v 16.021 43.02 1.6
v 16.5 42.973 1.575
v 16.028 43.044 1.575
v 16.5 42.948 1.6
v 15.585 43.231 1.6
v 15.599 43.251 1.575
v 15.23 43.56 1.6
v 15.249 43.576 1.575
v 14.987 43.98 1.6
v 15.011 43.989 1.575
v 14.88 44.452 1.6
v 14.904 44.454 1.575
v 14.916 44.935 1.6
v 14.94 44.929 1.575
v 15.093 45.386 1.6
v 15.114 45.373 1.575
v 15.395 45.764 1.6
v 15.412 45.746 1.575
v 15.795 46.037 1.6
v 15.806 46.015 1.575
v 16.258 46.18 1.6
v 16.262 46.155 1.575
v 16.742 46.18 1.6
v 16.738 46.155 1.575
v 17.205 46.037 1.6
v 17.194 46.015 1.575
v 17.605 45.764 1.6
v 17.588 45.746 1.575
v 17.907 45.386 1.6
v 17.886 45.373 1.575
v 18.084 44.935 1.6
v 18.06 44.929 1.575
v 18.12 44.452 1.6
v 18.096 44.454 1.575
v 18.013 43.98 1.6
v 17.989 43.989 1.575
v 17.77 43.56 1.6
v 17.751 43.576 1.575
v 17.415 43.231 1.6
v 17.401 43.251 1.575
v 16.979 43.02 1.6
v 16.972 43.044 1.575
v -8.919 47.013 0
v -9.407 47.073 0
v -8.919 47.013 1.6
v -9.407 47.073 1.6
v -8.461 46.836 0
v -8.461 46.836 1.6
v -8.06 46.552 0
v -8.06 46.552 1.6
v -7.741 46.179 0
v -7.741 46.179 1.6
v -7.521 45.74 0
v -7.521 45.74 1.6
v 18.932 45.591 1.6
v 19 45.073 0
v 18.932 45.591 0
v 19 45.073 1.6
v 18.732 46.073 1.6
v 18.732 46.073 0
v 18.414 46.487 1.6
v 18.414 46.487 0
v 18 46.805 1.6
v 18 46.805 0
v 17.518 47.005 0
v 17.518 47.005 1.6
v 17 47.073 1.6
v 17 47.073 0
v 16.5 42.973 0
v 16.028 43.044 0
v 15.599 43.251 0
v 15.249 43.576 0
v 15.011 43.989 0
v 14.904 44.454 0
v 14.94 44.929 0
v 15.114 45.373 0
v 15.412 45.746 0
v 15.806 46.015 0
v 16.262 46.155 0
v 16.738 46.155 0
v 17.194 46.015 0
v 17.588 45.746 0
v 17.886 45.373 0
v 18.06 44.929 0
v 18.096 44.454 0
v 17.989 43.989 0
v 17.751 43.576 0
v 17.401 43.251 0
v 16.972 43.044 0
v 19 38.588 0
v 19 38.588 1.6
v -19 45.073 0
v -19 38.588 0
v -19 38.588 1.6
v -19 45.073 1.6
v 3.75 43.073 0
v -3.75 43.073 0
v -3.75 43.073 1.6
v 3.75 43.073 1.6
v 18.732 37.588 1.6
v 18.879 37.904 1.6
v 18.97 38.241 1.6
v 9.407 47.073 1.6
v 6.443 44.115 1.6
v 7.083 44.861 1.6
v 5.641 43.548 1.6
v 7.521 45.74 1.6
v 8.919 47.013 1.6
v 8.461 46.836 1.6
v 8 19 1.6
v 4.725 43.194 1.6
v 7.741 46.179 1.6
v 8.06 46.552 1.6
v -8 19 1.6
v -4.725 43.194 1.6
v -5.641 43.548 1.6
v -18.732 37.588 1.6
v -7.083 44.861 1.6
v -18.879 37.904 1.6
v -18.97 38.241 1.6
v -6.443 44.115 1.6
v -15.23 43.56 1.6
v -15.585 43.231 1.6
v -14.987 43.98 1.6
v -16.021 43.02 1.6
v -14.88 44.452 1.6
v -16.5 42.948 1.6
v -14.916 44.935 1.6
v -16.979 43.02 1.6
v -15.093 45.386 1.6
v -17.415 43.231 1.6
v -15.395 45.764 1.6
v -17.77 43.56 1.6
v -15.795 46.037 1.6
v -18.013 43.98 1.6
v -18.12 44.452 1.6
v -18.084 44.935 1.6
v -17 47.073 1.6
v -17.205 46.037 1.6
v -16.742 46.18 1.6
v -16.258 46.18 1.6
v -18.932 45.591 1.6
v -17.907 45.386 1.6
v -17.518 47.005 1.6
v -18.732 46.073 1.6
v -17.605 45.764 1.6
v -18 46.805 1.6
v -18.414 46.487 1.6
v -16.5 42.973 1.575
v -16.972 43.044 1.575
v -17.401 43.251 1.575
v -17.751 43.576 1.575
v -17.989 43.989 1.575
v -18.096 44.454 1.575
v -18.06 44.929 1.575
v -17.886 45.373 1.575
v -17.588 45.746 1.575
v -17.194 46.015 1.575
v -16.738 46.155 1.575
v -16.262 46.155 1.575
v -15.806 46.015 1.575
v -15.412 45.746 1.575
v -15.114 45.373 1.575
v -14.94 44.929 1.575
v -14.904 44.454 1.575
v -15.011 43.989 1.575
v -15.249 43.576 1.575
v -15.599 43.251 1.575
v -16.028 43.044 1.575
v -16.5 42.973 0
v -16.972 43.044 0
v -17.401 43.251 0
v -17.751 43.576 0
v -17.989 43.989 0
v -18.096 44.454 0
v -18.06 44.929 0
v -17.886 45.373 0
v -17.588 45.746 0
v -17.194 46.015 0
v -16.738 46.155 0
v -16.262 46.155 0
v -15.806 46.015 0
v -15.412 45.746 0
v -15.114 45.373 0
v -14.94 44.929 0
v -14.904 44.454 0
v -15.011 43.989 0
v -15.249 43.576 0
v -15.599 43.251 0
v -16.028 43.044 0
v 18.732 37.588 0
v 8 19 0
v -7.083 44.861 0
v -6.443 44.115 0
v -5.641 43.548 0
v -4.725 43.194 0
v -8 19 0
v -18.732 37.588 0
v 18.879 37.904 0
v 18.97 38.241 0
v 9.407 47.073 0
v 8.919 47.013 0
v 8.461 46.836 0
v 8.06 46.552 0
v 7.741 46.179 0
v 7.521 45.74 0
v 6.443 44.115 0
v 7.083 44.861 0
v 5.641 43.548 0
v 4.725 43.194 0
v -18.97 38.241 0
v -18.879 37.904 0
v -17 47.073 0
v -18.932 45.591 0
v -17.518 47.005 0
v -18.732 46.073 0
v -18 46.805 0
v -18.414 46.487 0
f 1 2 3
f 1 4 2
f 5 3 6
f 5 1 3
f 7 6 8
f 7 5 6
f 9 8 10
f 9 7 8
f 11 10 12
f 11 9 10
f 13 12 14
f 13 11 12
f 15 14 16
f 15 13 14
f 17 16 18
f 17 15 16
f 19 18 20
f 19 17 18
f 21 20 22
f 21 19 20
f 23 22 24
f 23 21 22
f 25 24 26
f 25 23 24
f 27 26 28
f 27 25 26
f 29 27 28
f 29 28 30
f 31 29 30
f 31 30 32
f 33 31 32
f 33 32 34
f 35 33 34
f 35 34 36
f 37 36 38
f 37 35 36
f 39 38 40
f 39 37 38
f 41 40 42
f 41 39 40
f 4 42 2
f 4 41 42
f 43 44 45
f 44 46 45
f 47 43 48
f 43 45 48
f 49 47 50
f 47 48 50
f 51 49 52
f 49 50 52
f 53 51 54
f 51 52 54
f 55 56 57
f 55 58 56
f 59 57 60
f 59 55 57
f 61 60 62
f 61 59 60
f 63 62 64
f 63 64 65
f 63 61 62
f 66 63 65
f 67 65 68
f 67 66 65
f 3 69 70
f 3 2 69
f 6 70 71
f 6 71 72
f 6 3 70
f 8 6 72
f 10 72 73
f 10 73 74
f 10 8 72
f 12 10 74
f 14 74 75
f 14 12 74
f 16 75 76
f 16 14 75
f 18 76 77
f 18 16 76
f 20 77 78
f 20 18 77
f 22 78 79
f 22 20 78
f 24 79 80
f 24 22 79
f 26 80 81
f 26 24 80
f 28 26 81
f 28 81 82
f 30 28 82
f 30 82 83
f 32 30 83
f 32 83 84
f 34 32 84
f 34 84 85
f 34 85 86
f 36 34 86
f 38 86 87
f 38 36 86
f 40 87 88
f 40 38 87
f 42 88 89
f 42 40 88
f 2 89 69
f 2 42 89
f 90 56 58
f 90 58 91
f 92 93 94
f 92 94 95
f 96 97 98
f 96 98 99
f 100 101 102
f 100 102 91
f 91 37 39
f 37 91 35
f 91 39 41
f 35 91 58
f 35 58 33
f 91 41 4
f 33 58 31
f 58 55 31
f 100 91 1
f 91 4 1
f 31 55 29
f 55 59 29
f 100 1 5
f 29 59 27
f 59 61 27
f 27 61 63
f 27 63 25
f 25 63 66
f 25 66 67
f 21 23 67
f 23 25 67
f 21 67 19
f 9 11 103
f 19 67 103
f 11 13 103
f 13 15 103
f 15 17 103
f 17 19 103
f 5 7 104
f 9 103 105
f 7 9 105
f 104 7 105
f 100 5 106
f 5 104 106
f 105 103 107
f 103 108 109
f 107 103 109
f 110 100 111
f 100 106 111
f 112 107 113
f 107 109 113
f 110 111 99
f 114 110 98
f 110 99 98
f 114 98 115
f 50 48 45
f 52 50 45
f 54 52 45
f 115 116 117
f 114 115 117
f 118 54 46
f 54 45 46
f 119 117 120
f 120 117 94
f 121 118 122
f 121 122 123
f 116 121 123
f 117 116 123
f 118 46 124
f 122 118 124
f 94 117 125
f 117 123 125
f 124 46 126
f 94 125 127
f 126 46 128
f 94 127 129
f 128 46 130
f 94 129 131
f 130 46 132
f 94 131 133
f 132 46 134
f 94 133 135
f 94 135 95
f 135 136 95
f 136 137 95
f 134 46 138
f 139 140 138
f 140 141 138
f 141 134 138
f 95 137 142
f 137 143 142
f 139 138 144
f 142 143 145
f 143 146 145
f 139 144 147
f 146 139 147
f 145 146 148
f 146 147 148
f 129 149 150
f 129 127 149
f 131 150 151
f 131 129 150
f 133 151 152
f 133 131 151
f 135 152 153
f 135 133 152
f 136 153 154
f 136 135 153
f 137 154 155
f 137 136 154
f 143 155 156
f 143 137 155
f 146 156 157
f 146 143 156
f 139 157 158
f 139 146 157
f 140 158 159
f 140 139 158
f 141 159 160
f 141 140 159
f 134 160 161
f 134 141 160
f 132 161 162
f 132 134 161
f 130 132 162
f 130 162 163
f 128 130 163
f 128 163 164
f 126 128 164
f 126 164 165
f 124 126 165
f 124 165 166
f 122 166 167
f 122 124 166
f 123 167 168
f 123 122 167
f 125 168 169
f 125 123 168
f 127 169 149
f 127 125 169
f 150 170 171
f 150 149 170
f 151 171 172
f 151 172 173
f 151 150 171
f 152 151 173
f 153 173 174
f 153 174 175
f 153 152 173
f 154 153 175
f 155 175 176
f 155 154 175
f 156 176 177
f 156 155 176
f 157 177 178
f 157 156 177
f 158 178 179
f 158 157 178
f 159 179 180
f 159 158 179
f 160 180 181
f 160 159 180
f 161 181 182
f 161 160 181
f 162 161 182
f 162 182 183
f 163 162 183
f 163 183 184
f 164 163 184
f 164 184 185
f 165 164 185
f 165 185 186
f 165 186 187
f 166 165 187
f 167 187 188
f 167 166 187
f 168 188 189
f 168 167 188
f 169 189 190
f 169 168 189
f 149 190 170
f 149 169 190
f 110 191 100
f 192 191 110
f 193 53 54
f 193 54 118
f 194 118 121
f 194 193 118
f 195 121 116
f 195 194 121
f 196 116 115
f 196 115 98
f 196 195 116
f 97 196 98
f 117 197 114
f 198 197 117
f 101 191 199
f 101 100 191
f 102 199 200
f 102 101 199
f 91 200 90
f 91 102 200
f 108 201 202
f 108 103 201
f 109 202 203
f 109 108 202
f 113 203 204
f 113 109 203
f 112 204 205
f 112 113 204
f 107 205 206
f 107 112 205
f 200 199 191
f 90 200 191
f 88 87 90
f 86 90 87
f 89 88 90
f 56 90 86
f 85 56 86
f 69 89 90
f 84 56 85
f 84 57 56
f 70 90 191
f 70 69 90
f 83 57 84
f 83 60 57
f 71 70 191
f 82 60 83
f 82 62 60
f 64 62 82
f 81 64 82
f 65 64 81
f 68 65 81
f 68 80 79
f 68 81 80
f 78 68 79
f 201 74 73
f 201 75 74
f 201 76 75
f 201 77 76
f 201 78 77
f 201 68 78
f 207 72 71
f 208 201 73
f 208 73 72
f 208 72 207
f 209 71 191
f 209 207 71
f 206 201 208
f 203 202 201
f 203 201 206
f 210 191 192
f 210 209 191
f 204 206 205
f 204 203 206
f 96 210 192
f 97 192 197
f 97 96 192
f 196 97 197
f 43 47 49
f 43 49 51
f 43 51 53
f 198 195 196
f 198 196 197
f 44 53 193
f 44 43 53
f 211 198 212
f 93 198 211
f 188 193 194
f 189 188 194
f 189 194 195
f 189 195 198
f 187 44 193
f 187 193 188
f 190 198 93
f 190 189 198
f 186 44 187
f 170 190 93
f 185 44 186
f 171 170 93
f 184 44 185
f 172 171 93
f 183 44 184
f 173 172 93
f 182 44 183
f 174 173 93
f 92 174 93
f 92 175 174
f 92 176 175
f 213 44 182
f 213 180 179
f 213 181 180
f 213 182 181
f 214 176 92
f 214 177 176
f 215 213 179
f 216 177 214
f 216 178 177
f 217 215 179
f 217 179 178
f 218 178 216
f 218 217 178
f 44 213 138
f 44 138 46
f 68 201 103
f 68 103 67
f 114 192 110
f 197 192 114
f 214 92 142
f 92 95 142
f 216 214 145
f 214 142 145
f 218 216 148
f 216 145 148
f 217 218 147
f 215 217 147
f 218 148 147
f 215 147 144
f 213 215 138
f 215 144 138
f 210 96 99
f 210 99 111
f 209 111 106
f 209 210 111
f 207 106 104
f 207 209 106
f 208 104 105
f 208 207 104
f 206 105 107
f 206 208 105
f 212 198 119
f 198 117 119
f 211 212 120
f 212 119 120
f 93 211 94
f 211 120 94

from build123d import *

# Parameters (mm, degrees)
BOSS_EXTRUDE1_DEPTH           = 1.6
M3_CLEARANCE_HOLE1_AT_2_COUNT = 2
M3_CLEARANCE_HOLE1_AT_2_PITCH = 33
FILLET1_R                     = 2


with BuildPart() as part:
    # Sketch1 → Boss-Extrude1 (new body)
    with BuildSketch(Plane.XY):
        with BuildLine():
            Line((8, 19), (-8, 19))
            Line((-8, 19), (-19, 38.052558883))
            Line((-19, 38.052558883), (-19, 47.073195958))
            Line((-19, 47.073195958), (-7.75, 47.073195958))
            ThreePointArc((-7.75, 47.073195958), (-6.578427125, 44.244768833), (-3.75, 43.073195958))
            Line((-3.75, 43.073195958), (3.75, 43.073195958))
            ThreePointArc((3.75, 43.073195958), (6.578427125, 44.244768833), (7.75, 47.073195958))
            Line((7.75, 47.073195958), (19, 47.073195958))
            Line((19, 47.073195958), (19, 38.052558883))
            Line((19, 38.052558883), (8, 19))
        make_face()
    extrude(amount=BOSS_EXTRUDE1_DEPTH)

    # Sketch3 → M3 Clearance Hole1 (revolve, cut)
    with BuildSketch(Plane(origin=(16.5, 44.573195958, 1.6), x_dir=(0, -1, 0), z_dir=(1, 0, 0))):
        Polygon((0, 0), (0, 1.6), (1.6, 1.6), (1.6, 0.025), (1.625, 0), align=None)
    m3_clearance_hole1 = revolve(axis=Axis((16.5, 44.573195958, 7.95), (0, 0, -1)), mode=Mode.SUBTRACT)

    # M3 Clearance Hole1 at 2: M3 Clearance Hole1 ×2
    with Locations(*[(-i * M3_CLEARANCE_HOLE1_AT_2_PITCH, 0, 0) for i in range(1, M3_CLEARANCE_HOLE1_AT_2_COUNT)]):
        add(m3_clearance_hole1, mode=Mode.SUBTRACT)

    # Fillet1
    fillet1_edges = [part.edges().sort_by_distance(p)[0] for p in [
        (-19, 47.073195958, 0.8),
        (-7.75, 47.073195958, 0.8),
        (7.75, 47.073195958, 0.8),
        (19, 47.073195958, 0.8),
        (19, 38.052558883, 0.8),
        (-19, 38.052558883, 0.8),
    ]]
    fillet(fillet1_edges, radius=FILLET1_R)


solid = part.part
